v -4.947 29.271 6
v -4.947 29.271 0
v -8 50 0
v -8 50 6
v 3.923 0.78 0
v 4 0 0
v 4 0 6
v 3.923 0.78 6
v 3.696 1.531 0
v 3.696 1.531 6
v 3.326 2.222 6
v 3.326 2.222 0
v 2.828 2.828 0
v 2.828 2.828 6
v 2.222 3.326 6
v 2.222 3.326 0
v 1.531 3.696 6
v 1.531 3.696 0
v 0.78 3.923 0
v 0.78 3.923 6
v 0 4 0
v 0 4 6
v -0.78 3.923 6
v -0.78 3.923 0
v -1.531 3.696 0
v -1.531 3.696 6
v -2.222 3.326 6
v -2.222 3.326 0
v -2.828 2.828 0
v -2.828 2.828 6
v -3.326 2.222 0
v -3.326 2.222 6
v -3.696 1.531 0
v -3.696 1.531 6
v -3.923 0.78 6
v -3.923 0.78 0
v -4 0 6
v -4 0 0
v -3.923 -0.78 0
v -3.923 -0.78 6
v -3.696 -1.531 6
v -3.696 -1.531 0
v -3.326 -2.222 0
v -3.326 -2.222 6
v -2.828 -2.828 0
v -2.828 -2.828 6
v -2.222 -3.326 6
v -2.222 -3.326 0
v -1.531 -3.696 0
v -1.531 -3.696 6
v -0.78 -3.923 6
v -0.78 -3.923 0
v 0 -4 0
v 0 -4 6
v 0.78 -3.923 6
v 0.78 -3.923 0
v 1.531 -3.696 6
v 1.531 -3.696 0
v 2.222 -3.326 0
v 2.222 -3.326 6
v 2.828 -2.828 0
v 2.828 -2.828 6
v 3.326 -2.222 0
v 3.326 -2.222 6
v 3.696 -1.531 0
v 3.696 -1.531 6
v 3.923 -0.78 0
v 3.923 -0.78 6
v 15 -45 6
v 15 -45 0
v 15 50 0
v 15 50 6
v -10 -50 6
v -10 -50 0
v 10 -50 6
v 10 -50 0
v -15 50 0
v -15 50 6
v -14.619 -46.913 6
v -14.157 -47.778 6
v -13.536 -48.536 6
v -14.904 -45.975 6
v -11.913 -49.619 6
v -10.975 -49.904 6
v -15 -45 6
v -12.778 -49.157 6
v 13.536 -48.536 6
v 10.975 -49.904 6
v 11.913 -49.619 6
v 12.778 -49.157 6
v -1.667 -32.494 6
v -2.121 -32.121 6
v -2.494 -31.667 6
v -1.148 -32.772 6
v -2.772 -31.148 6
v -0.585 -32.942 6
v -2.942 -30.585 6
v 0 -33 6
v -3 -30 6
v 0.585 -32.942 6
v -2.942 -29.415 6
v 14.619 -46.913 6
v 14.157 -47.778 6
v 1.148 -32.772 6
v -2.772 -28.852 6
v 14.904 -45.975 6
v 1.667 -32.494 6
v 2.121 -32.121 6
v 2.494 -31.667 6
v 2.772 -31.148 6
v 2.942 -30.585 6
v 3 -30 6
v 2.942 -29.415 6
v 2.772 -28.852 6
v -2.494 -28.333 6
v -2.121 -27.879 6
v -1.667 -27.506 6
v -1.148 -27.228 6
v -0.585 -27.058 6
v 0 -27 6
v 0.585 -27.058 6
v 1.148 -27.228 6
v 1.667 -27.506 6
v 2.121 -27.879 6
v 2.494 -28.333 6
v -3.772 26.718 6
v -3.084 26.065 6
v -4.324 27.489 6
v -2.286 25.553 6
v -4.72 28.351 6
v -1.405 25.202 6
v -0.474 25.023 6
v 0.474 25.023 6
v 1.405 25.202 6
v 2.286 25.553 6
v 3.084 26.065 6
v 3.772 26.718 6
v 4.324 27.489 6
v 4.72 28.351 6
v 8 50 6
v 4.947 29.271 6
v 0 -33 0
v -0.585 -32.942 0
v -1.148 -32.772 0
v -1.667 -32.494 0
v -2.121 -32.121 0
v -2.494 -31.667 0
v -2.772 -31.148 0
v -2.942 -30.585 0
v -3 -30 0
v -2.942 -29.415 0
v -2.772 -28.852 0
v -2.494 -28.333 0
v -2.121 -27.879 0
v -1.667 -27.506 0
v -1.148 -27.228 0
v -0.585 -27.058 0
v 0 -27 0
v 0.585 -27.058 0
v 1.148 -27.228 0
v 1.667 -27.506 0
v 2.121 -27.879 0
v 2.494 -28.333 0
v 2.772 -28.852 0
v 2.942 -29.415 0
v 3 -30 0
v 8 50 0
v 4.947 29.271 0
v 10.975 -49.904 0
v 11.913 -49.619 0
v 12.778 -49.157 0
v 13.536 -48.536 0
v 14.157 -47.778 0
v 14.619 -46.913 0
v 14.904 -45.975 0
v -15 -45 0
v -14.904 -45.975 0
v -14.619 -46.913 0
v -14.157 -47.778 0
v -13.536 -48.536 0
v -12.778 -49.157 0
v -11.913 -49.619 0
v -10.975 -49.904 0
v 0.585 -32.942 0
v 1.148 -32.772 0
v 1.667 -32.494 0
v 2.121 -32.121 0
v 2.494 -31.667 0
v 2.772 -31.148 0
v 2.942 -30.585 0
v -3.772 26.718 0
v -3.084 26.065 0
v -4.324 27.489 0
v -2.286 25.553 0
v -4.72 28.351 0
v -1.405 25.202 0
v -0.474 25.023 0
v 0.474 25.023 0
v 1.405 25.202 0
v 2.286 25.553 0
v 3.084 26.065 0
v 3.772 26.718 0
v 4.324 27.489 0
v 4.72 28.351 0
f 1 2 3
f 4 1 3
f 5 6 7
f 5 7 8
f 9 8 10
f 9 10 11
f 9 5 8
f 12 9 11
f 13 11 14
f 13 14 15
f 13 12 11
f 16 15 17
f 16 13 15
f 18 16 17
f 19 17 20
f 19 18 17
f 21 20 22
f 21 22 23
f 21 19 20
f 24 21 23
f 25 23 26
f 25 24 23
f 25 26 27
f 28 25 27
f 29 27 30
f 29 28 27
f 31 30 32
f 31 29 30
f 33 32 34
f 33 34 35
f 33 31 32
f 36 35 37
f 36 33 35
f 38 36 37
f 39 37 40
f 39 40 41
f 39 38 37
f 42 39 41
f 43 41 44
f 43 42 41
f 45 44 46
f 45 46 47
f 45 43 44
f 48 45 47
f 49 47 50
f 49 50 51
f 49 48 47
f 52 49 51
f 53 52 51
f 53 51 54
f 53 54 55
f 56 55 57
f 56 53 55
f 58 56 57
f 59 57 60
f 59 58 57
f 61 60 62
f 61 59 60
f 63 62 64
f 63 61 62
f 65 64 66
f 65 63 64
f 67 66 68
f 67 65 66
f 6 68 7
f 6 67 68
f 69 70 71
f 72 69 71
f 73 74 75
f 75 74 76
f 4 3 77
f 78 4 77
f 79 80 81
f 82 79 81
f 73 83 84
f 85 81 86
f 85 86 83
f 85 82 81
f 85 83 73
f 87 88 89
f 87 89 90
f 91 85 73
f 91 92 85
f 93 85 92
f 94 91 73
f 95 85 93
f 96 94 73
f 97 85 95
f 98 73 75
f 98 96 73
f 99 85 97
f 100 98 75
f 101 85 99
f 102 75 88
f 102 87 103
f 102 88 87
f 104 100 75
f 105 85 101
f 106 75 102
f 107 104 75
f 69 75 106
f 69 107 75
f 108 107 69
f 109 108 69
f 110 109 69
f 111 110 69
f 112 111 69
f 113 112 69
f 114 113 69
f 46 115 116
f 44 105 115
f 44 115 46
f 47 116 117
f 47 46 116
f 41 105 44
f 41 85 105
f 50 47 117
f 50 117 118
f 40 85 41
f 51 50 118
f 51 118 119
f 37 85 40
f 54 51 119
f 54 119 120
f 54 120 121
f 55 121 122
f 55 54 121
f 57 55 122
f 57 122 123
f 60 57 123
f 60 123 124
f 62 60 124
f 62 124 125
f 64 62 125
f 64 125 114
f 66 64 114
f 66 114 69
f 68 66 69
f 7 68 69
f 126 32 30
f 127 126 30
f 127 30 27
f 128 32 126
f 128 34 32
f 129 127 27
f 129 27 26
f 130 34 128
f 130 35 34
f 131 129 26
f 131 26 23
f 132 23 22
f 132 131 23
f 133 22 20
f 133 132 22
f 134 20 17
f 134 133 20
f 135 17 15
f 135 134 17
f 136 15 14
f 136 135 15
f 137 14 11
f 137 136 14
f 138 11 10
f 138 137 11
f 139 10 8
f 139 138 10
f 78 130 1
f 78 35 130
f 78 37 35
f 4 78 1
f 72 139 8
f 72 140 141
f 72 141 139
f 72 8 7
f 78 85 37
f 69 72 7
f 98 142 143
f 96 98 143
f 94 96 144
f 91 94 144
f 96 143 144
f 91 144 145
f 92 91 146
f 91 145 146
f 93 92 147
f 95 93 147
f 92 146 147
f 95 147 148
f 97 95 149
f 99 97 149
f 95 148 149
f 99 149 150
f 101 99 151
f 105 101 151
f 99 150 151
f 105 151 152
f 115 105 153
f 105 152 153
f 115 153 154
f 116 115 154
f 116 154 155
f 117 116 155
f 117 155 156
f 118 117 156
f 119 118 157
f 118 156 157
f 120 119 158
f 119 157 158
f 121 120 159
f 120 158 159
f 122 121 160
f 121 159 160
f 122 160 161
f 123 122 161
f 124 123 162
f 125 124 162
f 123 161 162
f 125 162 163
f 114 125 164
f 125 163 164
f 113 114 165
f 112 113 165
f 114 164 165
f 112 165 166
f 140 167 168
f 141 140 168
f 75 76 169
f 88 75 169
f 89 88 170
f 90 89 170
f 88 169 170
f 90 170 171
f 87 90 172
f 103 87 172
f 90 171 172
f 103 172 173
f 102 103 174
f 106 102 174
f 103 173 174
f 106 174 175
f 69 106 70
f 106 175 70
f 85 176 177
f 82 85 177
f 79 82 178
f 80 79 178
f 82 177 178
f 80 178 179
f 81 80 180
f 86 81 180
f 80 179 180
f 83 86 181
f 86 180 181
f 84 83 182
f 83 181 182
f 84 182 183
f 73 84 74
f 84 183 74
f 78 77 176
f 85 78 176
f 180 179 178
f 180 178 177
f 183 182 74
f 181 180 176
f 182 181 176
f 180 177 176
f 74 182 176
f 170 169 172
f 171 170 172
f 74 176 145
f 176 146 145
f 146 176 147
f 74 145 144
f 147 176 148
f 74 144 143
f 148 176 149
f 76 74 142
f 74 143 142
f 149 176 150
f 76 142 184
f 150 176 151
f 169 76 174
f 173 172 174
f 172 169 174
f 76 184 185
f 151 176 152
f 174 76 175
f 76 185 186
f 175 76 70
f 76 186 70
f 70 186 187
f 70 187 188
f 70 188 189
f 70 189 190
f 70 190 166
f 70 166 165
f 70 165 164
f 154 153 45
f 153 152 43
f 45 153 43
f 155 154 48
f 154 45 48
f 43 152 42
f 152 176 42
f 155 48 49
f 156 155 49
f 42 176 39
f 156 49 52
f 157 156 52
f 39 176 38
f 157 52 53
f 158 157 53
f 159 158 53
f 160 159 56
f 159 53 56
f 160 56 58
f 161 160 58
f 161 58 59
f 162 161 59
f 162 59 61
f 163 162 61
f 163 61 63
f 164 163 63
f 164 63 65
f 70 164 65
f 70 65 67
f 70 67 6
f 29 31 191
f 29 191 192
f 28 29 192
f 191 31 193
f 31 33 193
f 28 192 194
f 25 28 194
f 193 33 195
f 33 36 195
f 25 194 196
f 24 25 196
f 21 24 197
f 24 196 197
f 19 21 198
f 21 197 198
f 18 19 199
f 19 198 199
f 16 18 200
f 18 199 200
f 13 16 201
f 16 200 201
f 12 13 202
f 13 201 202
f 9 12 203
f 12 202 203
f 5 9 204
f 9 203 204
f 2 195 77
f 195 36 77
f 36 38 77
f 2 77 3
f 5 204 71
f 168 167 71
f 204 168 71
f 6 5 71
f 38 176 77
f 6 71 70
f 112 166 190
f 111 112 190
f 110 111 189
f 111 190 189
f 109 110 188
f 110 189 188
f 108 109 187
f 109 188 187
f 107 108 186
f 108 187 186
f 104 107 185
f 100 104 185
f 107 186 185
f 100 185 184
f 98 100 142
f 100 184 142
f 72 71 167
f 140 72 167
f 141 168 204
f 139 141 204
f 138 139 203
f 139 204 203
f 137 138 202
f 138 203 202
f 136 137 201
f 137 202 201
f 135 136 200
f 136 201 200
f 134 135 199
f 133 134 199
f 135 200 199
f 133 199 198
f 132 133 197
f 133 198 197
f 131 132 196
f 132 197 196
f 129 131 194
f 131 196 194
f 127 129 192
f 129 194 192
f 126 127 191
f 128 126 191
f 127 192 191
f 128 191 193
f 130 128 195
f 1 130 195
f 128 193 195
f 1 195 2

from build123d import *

# Parameters (mm, degrees)
F0_R     = 4
F1_DEPTH = 6


with BuildPart() as f1:
    # F0 (on Top) → F1 (new body)
    with BuildSketch(Plane.XY):
        with BuildLine():
            Line((-8, 50), (-15, 50))
            Line((-15, 50), (-15, -45))
            ThreePointArc((-15, -45), (-13.535534, -48.535534), (-10, -50))
            Line((-10, -50), (0, -50))
            Line((0, -50), (10, -50))
            ThreePointArc((10, -50), (13.535534, -48.535534), (15, -45))
            Line((15, -45), (15, 50))
            Line((15, 50), (8, 50))
            Line((8, 50), (4.946622, 29.271351))
            ThreePointArc((4.946622, 29.271351), (0, 25), (-4.946622, 29.271351))
            Line((-4.946622, 29.271351), (-8, 50))
        make_face()
        with BuildLine():
            ThreePointArc((3, -30), (2.12132, -32.12132), (0, -33))
            ThreePointArc((0, -33), (-2.12132, -27.87868), (3, -30))
        make_face(mode=Mode.SUBTRACT)
        Circle(F0_R, mode=Mode.SUBTRACT)
    extrude(amount=F1_DEPTH)


solid = f1.part
